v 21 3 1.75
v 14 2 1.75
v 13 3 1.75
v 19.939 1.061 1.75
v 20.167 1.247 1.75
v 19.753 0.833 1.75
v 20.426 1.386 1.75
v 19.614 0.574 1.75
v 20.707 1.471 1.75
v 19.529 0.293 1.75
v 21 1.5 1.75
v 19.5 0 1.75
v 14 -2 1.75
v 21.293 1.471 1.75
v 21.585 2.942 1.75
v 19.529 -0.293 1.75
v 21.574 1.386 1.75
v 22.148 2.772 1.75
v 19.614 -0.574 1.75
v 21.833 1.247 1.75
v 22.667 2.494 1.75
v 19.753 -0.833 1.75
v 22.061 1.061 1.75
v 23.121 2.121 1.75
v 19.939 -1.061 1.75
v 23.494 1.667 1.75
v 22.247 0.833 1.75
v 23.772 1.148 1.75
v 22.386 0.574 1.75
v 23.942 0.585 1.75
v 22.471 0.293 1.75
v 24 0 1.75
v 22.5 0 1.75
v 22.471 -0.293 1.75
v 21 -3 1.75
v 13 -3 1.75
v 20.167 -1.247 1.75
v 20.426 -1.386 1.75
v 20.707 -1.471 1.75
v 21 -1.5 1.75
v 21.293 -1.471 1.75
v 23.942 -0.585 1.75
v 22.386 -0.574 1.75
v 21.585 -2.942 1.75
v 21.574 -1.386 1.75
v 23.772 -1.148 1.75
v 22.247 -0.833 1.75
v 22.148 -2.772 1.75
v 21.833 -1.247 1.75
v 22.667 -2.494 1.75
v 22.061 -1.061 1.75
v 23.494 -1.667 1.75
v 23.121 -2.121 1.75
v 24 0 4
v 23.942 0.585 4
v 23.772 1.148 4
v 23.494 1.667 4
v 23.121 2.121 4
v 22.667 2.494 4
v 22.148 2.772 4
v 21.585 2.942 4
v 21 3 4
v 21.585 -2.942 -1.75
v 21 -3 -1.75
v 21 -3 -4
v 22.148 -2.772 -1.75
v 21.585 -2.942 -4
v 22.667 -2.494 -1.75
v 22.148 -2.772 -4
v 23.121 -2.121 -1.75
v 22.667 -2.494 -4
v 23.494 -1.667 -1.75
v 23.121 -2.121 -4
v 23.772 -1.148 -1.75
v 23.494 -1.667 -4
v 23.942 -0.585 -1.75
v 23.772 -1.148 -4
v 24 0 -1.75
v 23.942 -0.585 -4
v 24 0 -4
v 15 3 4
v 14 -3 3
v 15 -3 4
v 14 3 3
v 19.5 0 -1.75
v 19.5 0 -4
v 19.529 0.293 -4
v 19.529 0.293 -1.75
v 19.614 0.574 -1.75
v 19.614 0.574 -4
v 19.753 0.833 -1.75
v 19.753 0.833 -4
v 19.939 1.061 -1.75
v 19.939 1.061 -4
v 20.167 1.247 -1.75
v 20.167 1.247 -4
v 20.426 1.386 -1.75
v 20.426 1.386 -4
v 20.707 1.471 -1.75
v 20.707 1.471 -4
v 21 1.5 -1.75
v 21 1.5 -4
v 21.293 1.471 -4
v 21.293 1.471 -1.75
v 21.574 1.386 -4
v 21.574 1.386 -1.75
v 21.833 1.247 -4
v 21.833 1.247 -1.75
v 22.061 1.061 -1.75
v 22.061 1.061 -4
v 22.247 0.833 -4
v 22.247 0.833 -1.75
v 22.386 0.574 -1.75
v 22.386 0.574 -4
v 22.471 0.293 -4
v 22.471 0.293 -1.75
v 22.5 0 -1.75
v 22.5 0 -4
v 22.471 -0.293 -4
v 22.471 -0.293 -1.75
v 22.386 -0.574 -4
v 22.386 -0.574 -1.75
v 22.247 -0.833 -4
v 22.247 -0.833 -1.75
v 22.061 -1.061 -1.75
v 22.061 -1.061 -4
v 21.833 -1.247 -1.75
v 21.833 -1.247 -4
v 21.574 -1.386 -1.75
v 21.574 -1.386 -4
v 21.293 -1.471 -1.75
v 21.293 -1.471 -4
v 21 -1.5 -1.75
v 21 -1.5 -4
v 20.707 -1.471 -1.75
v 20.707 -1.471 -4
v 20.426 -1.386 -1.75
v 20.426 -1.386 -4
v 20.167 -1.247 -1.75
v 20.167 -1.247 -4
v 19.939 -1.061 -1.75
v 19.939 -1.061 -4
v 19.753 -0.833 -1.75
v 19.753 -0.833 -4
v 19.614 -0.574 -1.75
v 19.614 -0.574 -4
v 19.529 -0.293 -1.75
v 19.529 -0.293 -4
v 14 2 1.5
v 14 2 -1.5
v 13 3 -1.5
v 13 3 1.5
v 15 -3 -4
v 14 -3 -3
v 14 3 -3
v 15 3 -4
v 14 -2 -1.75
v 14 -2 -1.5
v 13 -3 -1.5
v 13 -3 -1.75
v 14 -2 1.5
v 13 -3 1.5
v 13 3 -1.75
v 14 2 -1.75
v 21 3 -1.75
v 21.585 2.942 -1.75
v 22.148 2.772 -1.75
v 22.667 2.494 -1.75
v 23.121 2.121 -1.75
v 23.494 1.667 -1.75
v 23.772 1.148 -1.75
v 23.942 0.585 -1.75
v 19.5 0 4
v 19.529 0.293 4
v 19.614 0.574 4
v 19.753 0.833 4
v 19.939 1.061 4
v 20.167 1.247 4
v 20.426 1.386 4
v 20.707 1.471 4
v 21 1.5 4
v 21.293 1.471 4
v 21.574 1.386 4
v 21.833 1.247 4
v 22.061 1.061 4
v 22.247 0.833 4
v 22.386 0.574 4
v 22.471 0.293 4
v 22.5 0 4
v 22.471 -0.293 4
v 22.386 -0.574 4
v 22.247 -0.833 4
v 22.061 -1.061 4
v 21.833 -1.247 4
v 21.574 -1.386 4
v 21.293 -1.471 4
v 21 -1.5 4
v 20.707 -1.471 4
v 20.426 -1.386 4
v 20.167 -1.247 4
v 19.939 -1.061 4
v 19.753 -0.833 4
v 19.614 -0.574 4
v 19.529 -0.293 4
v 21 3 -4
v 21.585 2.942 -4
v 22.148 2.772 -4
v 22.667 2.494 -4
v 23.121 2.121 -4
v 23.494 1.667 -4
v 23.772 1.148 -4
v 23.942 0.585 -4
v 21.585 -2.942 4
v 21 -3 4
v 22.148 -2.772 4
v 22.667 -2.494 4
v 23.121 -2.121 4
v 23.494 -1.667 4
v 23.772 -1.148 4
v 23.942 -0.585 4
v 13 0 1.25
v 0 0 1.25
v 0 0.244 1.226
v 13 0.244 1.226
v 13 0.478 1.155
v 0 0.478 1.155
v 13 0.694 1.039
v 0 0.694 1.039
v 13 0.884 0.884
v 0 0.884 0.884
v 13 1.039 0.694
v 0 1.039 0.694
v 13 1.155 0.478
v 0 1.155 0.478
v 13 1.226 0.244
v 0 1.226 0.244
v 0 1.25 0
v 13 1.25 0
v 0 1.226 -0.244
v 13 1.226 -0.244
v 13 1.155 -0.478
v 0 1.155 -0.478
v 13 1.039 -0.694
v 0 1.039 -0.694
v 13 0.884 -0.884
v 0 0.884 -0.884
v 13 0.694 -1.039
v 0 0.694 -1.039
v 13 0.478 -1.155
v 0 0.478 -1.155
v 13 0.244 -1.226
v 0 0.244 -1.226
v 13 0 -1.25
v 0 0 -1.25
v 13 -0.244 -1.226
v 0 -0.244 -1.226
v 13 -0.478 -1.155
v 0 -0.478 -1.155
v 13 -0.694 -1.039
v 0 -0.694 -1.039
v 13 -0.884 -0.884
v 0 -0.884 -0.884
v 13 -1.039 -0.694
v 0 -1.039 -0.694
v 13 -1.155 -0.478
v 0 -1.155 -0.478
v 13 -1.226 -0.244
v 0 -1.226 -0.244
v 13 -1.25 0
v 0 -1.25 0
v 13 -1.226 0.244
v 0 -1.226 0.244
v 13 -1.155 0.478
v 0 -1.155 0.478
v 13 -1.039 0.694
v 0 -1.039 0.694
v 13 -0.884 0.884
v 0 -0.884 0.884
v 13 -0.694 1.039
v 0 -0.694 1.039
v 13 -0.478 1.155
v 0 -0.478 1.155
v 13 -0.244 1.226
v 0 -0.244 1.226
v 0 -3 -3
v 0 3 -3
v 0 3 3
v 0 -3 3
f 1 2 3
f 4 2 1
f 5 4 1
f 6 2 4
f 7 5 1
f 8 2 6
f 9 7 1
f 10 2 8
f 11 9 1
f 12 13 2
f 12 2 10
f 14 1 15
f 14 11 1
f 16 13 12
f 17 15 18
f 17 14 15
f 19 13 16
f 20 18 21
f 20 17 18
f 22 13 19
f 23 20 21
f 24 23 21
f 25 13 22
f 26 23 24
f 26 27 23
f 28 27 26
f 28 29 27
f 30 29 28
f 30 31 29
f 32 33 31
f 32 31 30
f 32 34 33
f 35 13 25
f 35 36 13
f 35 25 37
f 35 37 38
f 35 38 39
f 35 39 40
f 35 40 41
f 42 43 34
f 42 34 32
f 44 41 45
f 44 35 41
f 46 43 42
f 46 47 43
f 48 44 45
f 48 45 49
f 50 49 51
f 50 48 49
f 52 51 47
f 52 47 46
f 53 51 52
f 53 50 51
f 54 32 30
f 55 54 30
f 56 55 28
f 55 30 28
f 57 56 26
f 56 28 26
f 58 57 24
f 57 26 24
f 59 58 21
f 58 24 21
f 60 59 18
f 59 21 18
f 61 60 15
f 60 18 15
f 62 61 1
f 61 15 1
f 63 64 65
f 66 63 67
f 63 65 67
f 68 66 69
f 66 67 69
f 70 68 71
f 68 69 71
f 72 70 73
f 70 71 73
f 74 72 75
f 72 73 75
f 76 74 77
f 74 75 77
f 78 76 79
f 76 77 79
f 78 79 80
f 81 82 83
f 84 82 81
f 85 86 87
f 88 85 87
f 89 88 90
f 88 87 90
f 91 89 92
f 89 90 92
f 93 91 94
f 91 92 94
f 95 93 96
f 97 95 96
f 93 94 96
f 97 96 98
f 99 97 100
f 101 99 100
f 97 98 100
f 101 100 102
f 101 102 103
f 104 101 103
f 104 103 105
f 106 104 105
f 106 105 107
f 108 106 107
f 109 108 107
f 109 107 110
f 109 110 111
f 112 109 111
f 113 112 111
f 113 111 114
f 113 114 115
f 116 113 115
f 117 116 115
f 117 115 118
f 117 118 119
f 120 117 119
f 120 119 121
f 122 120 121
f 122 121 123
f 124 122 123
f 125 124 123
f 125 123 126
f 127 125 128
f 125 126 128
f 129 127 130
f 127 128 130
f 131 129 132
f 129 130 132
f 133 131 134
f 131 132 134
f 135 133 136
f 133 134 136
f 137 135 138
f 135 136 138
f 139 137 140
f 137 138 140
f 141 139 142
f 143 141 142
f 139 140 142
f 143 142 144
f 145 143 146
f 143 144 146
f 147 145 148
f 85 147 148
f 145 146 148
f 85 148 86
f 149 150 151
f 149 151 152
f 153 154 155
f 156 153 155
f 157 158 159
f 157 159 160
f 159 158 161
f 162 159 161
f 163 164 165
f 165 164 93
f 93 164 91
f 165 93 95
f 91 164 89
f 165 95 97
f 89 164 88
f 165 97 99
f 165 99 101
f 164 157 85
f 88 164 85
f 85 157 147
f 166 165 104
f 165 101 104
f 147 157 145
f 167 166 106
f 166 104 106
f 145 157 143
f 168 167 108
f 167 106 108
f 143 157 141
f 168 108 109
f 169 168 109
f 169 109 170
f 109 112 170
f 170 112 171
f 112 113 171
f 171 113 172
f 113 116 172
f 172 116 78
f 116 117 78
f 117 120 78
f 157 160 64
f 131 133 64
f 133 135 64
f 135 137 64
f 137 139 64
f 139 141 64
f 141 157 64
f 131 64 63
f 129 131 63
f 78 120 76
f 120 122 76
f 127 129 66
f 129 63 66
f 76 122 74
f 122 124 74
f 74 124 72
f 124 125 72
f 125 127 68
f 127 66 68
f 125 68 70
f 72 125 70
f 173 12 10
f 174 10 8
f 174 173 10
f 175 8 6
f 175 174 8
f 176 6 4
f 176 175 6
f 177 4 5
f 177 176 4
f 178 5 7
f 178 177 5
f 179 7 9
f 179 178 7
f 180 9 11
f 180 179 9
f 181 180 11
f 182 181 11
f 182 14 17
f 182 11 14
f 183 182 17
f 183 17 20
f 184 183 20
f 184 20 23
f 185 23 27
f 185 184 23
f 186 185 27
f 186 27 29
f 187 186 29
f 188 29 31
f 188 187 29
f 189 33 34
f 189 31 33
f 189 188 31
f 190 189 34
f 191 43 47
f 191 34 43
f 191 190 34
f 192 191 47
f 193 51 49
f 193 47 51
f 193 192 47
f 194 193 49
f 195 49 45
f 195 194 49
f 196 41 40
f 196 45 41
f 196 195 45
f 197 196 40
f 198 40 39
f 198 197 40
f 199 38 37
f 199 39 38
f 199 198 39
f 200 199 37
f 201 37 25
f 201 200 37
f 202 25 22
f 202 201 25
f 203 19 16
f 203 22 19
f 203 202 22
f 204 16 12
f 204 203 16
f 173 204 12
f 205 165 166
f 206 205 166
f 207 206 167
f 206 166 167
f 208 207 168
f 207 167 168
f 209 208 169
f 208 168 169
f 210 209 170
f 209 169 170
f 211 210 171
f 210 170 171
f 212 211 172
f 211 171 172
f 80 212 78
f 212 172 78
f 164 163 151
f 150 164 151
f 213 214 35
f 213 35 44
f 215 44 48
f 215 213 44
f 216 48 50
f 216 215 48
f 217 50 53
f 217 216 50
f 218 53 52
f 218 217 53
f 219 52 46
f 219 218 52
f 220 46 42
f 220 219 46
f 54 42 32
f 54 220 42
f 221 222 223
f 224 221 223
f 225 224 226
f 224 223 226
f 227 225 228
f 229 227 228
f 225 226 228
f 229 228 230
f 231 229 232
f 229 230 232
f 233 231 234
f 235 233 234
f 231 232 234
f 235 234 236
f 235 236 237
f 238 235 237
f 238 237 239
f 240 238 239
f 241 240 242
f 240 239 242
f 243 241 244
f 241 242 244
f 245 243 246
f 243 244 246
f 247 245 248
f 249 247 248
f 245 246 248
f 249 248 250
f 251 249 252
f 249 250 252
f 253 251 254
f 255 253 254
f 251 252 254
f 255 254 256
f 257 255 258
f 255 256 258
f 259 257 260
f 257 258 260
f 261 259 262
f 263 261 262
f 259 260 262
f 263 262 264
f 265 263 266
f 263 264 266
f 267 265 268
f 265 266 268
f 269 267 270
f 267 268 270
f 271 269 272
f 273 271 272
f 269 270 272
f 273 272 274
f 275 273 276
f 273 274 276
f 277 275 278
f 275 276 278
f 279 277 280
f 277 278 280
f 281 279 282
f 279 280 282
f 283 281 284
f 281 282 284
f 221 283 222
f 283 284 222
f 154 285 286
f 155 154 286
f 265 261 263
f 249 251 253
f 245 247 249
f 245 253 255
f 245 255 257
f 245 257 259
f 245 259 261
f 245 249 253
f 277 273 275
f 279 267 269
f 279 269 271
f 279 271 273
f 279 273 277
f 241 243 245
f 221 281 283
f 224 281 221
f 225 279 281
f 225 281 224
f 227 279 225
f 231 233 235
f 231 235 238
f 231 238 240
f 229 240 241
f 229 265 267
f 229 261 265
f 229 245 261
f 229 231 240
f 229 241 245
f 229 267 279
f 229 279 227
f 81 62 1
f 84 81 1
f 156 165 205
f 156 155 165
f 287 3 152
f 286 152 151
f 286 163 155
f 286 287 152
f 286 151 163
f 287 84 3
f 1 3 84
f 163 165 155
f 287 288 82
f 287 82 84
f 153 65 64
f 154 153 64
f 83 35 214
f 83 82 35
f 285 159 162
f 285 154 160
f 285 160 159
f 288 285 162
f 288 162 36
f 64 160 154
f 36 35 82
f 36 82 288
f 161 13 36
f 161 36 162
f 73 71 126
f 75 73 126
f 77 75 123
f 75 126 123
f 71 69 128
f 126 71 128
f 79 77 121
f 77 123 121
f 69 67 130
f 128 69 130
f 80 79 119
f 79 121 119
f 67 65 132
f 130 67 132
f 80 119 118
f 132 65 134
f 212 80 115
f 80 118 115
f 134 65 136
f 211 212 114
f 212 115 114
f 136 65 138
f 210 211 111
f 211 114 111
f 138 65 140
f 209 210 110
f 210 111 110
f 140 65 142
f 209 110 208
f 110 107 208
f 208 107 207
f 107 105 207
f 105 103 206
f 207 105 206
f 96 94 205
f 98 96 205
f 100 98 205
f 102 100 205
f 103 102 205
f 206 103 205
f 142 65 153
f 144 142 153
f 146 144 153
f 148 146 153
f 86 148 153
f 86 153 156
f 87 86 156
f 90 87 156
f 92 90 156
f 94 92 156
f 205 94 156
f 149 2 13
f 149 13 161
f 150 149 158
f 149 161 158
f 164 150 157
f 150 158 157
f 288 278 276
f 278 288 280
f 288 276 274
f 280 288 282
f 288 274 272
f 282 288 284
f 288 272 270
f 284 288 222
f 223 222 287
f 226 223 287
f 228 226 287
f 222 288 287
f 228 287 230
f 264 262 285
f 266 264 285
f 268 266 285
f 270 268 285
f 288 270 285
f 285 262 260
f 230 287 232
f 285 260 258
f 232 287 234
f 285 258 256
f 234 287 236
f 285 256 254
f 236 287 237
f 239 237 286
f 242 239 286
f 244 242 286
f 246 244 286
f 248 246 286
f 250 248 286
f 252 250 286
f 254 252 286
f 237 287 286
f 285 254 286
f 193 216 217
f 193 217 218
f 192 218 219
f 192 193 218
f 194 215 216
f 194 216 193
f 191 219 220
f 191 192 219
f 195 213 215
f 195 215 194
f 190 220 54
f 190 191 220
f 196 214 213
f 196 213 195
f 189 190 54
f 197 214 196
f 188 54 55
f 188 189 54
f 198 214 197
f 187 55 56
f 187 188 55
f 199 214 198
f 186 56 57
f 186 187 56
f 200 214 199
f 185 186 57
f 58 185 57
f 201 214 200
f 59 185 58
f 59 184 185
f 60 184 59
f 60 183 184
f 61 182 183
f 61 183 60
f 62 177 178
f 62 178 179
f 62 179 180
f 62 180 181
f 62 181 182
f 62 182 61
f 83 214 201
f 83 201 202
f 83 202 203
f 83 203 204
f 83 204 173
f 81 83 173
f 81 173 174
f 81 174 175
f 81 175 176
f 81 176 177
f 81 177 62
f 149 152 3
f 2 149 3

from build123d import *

# Parameters (mm, degrees)
SKETCH1_W                = 6
SKETCH1_H                = 6
BOSS_EXTRUDE1_DEPTH      = 14
SKETCH2_W                = 1
SKETCH2_H                = 6
SKETCH2_W_2              = 1.5
BOSS_EXTRUDE2_DEPTH      = 10
FILLET1_R                = 3
SKETCH3_R                = 1.5
CUT_EXTRUDE1_DEPTH       = 10
CHAMFER1_SIZE            = 1
CHAMFER2_SIZE            = 1
FILLET1_OF_MIRROR2_R     = 3
CHAMFER1_OF_MIRROR2_SIZE = 1
SKETCH4_R                = 1.25
CUT_EXTRUDE2_DEPTH       = 13
CHAMFER3_SIZE            = 1
CUT_EXTRUDE3_DEPTH       = 10
CUT_EXTRUDE3_DEPTH_BACK  = 10
SKETCH5_W                = 10
SKETCH5_H                = 0.25
CUT_EXTRUDE4_DEPTH       = 10
CUT_EXTRUDE4_DEPTH_BACK  = 10
SKETCH6_W                = 10
SKETCH6_H                = 0.25
CHAMFER4_SIZE            = 1


with BuildPart() as part:
    # Sketch1 → Boss-Extrude1 (new body)
    with BuildSketch(Plane(origin=(0, 0, 0), x_dir=(0, 0, -1), z_dir=(1, 0, 0))):
        Rectangle(SKETCH1_W, SKETCH1_H)
    boss_extrude1 = extrude(amount=BOSS_EXTRUDE1_DEPTH)

    # Sketch2 → Boss-Extrude2 (add)
    with BuildSketch(Plane(origin=(14, 0, 0), x_dir=(0, 0, -1), z_dir=(1, 0, 0))):
        with Locations((3.5, 0)):
            Rectangle(SKETCH2_W, SKETCH2_H)
        with Locations((2.25, 0)):
            Rectangle(SKETCH2_W_2, SKETCH2_H)
    boss_extrude2 = extrude(amount=BOSS_EXTRUDE2_DEPTH)

    # Fillet1
    fillet1_edges = [part.edges().sort_by_distance(p)[0] for p in [
        (24, 3, -2.75),
        (24, -3, -2.75),
    ]]
    fillet(fillet1_edges, radius=FILLET1_R - 0.0001)  # a hair under: the kernel refuses the full size

    # Sketch3 → Cut-Extrude1 (cut)
    with BuildSketch(Plane(origin=(0, 0, -4), x_dir=(-1, 0, 0), z_dir=(0, 0, -1))):
        with Locations((-21, 0)):
            Circle(SKETCH3_R)
    cut_extrude1 = extrude(amount=-CUT_EXTRUDE1_DEPTH, mode=Mode.SUBTRACT)

    # Chamfer1
    chamfer1_edges = [part.edges().sort_by_distance(p)[0] for p in [
        (14, 0, -4),
    ]]
    chamfer(chamfer1_edges, length=CHAMFER1_SIZE - 0.0001)  # a hair under: the kernel refuses the full size

    # Chamfer2
    chamfer2_edges = [part.edges().sort_by_distance(p)[0] for p in [
        (14, 3, 0.75),
        (14, -3, 0.75),
    ]]
    chamfer(chamfer2_edges, length=CHAMFER2_SIZE)

    # Mirror2: Boss-Extrude1, Boss-Extrude2, Cut-Extrude1 across plane
    add(boss_extrude1.mirror(Plane(origin=(0, 0, 0), x_dir=(1, 0, 0), z_dir=(0, 0, -1))))
    add(boss_extrude2.mirror(Plane(origin=(0, 0, 0), x_dir=(1, 0, 0), z_dir=(0, 0, -1))))
    add(cut_extrude1.mirror(Plane(origin=(0, 0, 0), x_dir=(1, 0, 0), z_dir=(0, 0, -1))), mode=Mode.SUBTRACT)

    # Fillet1 of Mirror2
    fillet1_of_mirror2_edges = [part.edges().sort_by_distance(p)[0] for p in [
        (24, 3, 2.75),
        (24, -3, 2.75),
    ]]
    fillet(fillet1_of_mirror2_edges, radius=FILLET1_OF_MIRROR2_R - 0.0001)  # a hair under: the kernel refuses the full size

    # Chamfer1 of Mirror2
    chamfer1_of_mirror2_edges = [part.edges().sort_by_distance(p)[0] for p in [
        (14, 0, 4),
    ]]
    chamfer(chamfer1_of_mirror2_edges, length=CHAMFER1_OF_MIRROR2_SIZE - 0.0001)  # a hair under: the kernel refuses the full size

    # Sketch4 → Cut-Extrude2 (cut)
    with BuildSketch(Plane.ZY):
        Circle(SKETCH4_R)
    extrude(amount=-CUT_EXTRUDE2_DEPTH, mode=Mode.SUBTRACT)

    # Chamfer3
    chamfer3_edges = [part.edges().sort_by_distance(p)[0] for p in [
        (14, -3, 0),
        (14, 3, 0),
    ]]
    chamfer(chamfer3_edges, length=CHAMFER3_SIZE)

    # Sketch5 → Cut-Extrude3 (cut, two sides: drawn at the far end of the back side and taken through both)
    with BuildSketch(Plane(origin=(0, 0, 0), x_dir=(1, 0, 0), z_dir=(0, 1, 0)).offset(-CUT_EXTRUDE3_DEPTH_BACK)):
        with Locations((19, -1.625)):
            Rectangle(SKETCH5_W, SKETCH5_H)
    extrude(amount=CUT_EXTRUDE3_DEPTH + CUT_EXTRUDE3_DEPTH_BACK, mode=Mode.SUBTRACT)

    # Sketch6 → Cut-Extrude4 (cut, two sides: drawn at the far end of the back side and taken through both)
    with BuildSketch(Plane(origin=(0, 0, 0), x_dir=(1, 0, 0), z_dir=(0, 1, 0)).offset(-CUT_EXTRUDE4_DEPTH_BACK)):
        with Locations((19, 1.625)):
            Rectangle(SKETCH6_W, SKETCH6_H)
    extrude(amount=CUT_EXTRUDE4_DEPTH + CUT_EXTRUDE4_DEPTH_BACK, mode=Mode.SUBTRACT)

    # Chamfer4
    chamfer4_edges = [part.edges().sort_by_distance(p)[0] for p in [
        (14, -3, 1.625),
        (14, -3, -1.625),
        (14, 3, -1.625),
        (14, 3, 1.625),
    ]]
    chamfer(chamfer4_edges, length=CHAMFER4_SIZE - 0.0001)  # a hair under: the kernel refuses the full size


solid = part.part
